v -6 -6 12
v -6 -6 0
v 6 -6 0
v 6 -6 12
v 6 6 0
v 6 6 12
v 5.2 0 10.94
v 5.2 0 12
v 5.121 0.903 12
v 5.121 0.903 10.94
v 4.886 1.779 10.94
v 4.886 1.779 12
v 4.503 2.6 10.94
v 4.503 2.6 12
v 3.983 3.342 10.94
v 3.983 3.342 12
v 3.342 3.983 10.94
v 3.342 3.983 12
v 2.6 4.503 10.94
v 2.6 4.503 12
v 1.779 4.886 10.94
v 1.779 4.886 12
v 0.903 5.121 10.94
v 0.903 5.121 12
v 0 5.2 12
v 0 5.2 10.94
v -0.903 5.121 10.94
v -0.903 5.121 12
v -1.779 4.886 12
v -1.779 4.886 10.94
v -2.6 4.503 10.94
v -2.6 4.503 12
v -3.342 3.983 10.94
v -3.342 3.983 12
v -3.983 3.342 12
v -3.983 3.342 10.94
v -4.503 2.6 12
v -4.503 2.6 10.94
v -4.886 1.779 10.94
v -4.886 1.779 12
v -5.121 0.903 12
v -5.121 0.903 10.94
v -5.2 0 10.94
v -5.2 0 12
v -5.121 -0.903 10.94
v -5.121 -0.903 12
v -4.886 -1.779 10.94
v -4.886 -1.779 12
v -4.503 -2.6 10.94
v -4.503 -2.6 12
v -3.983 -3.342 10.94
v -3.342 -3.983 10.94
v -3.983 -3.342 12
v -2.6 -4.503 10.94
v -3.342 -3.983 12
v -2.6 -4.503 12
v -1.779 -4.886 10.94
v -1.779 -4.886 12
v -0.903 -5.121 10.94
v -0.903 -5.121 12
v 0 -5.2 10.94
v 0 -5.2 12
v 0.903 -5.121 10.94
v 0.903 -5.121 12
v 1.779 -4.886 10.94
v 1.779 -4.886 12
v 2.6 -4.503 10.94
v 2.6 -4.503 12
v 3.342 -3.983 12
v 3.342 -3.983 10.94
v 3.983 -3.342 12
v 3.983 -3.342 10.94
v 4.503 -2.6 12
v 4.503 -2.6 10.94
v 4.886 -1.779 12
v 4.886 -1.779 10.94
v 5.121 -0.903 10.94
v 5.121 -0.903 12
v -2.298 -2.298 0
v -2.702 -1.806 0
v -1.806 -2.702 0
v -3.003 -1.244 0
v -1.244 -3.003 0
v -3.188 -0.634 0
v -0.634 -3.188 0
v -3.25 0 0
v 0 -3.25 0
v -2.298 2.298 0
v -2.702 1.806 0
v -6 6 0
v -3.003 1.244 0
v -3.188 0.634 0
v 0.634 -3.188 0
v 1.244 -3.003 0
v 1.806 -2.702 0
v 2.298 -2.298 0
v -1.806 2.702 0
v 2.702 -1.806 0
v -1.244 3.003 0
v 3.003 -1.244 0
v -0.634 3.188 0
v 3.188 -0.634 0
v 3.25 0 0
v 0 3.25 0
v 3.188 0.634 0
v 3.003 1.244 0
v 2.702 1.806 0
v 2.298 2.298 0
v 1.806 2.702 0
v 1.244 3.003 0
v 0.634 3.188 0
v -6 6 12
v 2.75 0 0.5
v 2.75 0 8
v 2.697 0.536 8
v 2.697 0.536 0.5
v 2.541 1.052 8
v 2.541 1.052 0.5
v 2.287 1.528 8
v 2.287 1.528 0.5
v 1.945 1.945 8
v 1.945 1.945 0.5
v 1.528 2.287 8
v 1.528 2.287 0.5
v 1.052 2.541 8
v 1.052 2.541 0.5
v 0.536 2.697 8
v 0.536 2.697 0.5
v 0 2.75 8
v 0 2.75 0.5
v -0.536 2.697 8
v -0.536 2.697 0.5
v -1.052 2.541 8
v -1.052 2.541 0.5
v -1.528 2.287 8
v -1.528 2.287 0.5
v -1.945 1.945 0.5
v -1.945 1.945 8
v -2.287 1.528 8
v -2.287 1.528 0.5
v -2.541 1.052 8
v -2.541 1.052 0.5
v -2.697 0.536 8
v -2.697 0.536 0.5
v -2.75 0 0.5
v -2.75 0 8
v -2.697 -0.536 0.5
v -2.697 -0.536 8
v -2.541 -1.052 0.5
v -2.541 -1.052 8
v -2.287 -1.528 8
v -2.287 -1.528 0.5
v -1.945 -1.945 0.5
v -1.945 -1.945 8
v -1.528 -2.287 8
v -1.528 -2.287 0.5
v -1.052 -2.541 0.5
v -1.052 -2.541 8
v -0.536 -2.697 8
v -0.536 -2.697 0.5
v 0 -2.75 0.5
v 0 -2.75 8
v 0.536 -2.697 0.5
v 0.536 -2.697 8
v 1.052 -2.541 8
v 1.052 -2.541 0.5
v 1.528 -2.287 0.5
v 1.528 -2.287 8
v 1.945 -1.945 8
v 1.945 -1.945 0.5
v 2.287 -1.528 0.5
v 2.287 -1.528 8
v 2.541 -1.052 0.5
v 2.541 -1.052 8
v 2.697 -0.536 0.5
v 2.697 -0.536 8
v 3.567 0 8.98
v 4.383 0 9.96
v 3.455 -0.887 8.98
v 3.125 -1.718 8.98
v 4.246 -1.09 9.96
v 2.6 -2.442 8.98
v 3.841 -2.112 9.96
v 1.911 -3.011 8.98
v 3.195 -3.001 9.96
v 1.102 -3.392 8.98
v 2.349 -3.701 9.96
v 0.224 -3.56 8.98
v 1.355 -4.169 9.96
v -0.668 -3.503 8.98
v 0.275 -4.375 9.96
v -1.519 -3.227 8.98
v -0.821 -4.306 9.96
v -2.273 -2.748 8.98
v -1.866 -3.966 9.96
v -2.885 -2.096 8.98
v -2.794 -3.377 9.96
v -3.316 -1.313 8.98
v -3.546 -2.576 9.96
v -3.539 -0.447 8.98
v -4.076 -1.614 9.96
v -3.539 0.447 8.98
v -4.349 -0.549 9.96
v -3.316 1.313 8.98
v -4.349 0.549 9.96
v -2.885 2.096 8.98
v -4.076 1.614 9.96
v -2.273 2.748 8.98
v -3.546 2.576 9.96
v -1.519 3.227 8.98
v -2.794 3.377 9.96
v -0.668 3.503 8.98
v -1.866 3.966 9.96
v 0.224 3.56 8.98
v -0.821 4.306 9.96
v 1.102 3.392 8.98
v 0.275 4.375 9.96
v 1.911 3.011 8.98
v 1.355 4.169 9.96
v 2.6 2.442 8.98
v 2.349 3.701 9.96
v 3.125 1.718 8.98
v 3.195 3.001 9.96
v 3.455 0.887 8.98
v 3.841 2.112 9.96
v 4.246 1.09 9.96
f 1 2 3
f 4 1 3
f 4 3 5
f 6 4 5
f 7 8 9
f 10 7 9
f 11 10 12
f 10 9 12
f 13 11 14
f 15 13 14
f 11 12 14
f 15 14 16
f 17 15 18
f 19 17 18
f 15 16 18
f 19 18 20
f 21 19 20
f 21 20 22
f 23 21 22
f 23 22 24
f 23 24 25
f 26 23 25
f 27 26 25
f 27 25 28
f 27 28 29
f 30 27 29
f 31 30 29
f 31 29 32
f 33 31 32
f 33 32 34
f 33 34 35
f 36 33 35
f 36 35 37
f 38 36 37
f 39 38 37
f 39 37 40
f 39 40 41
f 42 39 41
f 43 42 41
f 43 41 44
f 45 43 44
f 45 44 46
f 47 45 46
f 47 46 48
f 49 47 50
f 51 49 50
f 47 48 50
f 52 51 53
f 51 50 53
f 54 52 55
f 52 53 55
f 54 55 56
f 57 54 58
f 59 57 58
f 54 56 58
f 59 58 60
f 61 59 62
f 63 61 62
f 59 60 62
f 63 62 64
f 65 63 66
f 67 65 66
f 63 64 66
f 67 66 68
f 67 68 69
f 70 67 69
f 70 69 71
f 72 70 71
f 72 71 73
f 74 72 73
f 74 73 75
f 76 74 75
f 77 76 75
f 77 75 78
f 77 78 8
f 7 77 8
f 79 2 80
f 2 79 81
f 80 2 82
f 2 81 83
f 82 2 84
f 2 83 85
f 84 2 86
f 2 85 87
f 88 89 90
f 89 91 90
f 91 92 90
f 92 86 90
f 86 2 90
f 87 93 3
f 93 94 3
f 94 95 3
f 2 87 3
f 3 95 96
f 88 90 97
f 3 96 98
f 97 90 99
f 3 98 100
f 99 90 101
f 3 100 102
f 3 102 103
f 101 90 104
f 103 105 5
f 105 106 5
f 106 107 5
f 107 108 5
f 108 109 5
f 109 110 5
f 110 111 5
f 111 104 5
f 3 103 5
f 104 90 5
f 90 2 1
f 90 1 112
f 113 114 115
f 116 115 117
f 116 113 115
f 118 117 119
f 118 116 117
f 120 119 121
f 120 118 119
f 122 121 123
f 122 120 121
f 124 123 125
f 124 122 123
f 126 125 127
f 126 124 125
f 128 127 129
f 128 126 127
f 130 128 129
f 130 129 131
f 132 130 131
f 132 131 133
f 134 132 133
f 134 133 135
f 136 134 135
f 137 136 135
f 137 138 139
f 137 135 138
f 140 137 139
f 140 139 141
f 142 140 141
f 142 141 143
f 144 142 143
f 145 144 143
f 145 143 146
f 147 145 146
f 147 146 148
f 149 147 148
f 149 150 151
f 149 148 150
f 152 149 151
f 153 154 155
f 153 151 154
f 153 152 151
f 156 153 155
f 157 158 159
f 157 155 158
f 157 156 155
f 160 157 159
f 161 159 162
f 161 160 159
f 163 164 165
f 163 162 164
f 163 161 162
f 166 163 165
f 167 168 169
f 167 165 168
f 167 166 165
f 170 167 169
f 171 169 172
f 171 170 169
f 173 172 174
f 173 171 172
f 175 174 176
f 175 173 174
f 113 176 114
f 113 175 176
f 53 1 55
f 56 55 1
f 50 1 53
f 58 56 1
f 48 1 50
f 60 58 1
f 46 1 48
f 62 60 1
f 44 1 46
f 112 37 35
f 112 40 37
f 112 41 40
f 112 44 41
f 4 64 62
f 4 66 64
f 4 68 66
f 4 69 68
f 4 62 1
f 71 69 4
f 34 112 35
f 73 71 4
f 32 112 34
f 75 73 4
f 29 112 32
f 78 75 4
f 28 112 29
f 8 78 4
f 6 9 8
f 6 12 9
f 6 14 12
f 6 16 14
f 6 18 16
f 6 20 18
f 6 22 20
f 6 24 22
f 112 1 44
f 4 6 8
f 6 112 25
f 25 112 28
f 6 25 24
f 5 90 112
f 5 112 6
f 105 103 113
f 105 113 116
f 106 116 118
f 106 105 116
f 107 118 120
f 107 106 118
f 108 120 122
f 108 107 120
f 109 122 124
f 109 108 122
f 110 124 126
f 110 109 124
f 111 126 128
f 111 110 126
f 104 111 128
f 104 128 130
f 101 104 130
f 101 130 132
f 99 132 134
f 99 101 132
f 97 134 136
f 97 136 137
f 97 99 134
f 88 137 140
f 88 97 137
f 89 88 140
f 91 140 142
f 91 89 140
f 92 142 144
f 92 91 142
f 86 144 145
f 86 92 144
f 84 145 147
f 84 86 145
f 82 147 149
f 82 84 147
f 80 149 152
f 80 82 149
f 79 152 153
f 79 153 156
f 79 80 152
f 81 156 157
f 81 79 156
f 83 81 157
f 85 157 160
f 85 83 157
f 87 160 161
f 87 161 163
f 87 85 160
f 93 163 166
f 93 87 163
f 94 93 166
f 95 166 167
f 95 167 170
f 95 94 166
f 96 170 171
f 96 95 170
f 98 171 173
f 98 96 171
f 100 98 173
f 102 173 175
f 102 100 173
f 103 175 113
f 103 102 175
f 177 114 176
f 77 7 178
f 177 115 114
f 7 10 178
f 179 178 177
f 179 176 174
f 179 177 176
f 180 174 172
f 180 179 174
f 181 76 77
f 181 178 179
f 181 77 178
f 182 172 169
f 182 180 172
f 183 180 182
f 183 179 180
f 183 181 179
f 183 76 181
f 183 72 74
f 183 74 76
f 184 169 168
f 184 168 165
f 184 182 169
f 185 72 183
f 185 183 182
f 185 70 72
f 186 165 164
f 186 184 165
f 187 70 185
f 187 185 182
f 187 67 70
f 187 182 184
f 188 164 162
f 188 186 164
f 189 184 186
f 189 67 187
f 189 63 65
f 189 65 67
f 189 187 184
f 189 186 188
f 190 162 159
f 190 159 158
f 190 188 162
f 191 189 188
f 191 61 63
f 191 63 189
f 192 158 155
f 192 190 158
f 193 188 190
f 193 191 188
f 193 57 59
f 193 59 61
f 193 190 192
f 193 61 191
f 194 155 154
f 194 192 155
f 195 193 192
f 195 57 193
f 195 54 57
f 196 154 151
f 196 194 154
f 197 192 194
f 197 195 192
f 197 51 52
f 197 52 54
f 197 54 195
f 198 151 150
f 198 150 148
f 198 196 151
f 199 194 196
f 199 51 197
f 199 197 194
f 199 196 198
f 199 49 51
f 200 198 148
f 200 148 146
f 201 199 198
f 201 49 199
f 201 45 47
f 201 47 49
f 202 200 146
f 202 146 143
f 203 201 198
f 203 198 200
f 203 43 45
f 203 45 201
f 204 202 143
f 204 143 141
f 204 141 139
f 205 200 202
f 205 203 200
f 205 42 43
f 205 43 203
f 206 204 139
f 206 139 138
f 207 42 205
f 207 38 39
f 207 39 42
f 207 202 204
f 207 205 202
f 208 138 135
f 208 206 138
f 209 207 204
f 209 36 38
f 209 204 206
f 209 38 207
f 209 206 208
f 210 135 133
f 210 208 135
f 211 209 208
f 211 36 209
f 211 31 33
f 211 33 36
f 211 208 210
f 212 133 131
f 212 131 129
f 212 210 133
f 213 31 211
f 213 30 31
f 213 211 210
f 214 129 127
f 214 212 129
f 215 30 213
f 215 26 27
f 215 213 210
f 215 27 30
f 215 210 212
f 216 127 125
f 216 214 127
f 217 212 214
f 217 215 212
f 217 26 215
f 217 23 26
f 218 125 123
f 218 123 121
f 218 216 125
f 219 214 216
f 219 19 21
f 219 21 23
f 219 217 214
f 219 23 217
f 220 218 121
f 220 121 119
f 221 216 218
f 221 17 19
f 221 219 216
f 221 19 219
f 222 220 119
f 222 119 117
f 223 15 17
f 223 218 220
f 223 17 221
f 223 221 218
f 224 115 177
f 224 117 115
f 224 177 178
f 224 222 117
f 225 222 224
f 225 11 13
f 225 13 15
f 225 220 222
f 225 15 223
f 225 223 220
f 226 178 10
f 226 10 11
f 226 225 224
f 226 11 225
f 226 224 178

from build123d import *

# Parameters (mm, degrees)
SKETCH1_W           = 12
SKETCH1_H           = 12
SKETCH1_R           = 2.75
BOSS_EXTRUDE1_DEPTH = 12
SKETCH2_R           = 5.2
CUT_EXTRUDE1_DEPTH  = 1
CHAMFER1_SIZE       = 3
CHAMFER1_SIZE_2     = 2.5
CHAMFER2_SIZE       = 0.5


with BuildPart() as part:
    # Sketch1 → Boss-Extrude1 (new body)
    with BuildSketch(Plane.XY):
        Rectangle(SKETCH1_W, SKETCH1_H)
        Circle(SKETCH1_R, mode=Mode.SUBTRACT)
    extrude(amount=BOSS_EXTRUDE1_DEPTH)

    # Sketch2 → Cut-Extrude1 (cut)
    with BuildSketch(Plane.XY.offset(12)):
        Circle(SKETCH2_R)
    extrude(amount=-CUT_EXTRUDE1_DEPTH, mode=Mode.SUBTRACT)

    # Chamfer1
    # the kernel refuses this chamfer: 3, 2.5 mm, written as the material it takes off along each edge
    with BuildSketch(Plane(origin=(0, 0, 11), x_dir=(1, 0, 0), z_dir=(0, 1, 0))) as chamfer1_piece_1_section:
        Polygon((2.75, CHAMFER1_SIZE), (2.75 + CHAMFER1_SIZE_2, 0), (2.75, 0), align=None)
    chamfer1_piece_1 = revolve(axis=Axis((0, 0, 11), (0, 0, -1)), mode=Mode.PRIVATE)
    chamfer1_piece_1 = chamfer1_piece_1 & Plane(origin=(0, 0, 9.452892591), x_dir=(1, 0, 0), z_dir=(0, 0, 1)) * Cylinder(5.2, 21, mode=Mode.PRIVATE)
    add(chamfer1_piece_1, mode=Mode.SUBTRACT)

    # Chamfer2
    chamfer2_edges = [part.edges().sort_by_distance(p)[0] for p in [
        (-2.75, 0, 0),
    ]]
    chamfer(chamfer2_edges, length=CHAMFER2_SIZE)


solid = part.part
